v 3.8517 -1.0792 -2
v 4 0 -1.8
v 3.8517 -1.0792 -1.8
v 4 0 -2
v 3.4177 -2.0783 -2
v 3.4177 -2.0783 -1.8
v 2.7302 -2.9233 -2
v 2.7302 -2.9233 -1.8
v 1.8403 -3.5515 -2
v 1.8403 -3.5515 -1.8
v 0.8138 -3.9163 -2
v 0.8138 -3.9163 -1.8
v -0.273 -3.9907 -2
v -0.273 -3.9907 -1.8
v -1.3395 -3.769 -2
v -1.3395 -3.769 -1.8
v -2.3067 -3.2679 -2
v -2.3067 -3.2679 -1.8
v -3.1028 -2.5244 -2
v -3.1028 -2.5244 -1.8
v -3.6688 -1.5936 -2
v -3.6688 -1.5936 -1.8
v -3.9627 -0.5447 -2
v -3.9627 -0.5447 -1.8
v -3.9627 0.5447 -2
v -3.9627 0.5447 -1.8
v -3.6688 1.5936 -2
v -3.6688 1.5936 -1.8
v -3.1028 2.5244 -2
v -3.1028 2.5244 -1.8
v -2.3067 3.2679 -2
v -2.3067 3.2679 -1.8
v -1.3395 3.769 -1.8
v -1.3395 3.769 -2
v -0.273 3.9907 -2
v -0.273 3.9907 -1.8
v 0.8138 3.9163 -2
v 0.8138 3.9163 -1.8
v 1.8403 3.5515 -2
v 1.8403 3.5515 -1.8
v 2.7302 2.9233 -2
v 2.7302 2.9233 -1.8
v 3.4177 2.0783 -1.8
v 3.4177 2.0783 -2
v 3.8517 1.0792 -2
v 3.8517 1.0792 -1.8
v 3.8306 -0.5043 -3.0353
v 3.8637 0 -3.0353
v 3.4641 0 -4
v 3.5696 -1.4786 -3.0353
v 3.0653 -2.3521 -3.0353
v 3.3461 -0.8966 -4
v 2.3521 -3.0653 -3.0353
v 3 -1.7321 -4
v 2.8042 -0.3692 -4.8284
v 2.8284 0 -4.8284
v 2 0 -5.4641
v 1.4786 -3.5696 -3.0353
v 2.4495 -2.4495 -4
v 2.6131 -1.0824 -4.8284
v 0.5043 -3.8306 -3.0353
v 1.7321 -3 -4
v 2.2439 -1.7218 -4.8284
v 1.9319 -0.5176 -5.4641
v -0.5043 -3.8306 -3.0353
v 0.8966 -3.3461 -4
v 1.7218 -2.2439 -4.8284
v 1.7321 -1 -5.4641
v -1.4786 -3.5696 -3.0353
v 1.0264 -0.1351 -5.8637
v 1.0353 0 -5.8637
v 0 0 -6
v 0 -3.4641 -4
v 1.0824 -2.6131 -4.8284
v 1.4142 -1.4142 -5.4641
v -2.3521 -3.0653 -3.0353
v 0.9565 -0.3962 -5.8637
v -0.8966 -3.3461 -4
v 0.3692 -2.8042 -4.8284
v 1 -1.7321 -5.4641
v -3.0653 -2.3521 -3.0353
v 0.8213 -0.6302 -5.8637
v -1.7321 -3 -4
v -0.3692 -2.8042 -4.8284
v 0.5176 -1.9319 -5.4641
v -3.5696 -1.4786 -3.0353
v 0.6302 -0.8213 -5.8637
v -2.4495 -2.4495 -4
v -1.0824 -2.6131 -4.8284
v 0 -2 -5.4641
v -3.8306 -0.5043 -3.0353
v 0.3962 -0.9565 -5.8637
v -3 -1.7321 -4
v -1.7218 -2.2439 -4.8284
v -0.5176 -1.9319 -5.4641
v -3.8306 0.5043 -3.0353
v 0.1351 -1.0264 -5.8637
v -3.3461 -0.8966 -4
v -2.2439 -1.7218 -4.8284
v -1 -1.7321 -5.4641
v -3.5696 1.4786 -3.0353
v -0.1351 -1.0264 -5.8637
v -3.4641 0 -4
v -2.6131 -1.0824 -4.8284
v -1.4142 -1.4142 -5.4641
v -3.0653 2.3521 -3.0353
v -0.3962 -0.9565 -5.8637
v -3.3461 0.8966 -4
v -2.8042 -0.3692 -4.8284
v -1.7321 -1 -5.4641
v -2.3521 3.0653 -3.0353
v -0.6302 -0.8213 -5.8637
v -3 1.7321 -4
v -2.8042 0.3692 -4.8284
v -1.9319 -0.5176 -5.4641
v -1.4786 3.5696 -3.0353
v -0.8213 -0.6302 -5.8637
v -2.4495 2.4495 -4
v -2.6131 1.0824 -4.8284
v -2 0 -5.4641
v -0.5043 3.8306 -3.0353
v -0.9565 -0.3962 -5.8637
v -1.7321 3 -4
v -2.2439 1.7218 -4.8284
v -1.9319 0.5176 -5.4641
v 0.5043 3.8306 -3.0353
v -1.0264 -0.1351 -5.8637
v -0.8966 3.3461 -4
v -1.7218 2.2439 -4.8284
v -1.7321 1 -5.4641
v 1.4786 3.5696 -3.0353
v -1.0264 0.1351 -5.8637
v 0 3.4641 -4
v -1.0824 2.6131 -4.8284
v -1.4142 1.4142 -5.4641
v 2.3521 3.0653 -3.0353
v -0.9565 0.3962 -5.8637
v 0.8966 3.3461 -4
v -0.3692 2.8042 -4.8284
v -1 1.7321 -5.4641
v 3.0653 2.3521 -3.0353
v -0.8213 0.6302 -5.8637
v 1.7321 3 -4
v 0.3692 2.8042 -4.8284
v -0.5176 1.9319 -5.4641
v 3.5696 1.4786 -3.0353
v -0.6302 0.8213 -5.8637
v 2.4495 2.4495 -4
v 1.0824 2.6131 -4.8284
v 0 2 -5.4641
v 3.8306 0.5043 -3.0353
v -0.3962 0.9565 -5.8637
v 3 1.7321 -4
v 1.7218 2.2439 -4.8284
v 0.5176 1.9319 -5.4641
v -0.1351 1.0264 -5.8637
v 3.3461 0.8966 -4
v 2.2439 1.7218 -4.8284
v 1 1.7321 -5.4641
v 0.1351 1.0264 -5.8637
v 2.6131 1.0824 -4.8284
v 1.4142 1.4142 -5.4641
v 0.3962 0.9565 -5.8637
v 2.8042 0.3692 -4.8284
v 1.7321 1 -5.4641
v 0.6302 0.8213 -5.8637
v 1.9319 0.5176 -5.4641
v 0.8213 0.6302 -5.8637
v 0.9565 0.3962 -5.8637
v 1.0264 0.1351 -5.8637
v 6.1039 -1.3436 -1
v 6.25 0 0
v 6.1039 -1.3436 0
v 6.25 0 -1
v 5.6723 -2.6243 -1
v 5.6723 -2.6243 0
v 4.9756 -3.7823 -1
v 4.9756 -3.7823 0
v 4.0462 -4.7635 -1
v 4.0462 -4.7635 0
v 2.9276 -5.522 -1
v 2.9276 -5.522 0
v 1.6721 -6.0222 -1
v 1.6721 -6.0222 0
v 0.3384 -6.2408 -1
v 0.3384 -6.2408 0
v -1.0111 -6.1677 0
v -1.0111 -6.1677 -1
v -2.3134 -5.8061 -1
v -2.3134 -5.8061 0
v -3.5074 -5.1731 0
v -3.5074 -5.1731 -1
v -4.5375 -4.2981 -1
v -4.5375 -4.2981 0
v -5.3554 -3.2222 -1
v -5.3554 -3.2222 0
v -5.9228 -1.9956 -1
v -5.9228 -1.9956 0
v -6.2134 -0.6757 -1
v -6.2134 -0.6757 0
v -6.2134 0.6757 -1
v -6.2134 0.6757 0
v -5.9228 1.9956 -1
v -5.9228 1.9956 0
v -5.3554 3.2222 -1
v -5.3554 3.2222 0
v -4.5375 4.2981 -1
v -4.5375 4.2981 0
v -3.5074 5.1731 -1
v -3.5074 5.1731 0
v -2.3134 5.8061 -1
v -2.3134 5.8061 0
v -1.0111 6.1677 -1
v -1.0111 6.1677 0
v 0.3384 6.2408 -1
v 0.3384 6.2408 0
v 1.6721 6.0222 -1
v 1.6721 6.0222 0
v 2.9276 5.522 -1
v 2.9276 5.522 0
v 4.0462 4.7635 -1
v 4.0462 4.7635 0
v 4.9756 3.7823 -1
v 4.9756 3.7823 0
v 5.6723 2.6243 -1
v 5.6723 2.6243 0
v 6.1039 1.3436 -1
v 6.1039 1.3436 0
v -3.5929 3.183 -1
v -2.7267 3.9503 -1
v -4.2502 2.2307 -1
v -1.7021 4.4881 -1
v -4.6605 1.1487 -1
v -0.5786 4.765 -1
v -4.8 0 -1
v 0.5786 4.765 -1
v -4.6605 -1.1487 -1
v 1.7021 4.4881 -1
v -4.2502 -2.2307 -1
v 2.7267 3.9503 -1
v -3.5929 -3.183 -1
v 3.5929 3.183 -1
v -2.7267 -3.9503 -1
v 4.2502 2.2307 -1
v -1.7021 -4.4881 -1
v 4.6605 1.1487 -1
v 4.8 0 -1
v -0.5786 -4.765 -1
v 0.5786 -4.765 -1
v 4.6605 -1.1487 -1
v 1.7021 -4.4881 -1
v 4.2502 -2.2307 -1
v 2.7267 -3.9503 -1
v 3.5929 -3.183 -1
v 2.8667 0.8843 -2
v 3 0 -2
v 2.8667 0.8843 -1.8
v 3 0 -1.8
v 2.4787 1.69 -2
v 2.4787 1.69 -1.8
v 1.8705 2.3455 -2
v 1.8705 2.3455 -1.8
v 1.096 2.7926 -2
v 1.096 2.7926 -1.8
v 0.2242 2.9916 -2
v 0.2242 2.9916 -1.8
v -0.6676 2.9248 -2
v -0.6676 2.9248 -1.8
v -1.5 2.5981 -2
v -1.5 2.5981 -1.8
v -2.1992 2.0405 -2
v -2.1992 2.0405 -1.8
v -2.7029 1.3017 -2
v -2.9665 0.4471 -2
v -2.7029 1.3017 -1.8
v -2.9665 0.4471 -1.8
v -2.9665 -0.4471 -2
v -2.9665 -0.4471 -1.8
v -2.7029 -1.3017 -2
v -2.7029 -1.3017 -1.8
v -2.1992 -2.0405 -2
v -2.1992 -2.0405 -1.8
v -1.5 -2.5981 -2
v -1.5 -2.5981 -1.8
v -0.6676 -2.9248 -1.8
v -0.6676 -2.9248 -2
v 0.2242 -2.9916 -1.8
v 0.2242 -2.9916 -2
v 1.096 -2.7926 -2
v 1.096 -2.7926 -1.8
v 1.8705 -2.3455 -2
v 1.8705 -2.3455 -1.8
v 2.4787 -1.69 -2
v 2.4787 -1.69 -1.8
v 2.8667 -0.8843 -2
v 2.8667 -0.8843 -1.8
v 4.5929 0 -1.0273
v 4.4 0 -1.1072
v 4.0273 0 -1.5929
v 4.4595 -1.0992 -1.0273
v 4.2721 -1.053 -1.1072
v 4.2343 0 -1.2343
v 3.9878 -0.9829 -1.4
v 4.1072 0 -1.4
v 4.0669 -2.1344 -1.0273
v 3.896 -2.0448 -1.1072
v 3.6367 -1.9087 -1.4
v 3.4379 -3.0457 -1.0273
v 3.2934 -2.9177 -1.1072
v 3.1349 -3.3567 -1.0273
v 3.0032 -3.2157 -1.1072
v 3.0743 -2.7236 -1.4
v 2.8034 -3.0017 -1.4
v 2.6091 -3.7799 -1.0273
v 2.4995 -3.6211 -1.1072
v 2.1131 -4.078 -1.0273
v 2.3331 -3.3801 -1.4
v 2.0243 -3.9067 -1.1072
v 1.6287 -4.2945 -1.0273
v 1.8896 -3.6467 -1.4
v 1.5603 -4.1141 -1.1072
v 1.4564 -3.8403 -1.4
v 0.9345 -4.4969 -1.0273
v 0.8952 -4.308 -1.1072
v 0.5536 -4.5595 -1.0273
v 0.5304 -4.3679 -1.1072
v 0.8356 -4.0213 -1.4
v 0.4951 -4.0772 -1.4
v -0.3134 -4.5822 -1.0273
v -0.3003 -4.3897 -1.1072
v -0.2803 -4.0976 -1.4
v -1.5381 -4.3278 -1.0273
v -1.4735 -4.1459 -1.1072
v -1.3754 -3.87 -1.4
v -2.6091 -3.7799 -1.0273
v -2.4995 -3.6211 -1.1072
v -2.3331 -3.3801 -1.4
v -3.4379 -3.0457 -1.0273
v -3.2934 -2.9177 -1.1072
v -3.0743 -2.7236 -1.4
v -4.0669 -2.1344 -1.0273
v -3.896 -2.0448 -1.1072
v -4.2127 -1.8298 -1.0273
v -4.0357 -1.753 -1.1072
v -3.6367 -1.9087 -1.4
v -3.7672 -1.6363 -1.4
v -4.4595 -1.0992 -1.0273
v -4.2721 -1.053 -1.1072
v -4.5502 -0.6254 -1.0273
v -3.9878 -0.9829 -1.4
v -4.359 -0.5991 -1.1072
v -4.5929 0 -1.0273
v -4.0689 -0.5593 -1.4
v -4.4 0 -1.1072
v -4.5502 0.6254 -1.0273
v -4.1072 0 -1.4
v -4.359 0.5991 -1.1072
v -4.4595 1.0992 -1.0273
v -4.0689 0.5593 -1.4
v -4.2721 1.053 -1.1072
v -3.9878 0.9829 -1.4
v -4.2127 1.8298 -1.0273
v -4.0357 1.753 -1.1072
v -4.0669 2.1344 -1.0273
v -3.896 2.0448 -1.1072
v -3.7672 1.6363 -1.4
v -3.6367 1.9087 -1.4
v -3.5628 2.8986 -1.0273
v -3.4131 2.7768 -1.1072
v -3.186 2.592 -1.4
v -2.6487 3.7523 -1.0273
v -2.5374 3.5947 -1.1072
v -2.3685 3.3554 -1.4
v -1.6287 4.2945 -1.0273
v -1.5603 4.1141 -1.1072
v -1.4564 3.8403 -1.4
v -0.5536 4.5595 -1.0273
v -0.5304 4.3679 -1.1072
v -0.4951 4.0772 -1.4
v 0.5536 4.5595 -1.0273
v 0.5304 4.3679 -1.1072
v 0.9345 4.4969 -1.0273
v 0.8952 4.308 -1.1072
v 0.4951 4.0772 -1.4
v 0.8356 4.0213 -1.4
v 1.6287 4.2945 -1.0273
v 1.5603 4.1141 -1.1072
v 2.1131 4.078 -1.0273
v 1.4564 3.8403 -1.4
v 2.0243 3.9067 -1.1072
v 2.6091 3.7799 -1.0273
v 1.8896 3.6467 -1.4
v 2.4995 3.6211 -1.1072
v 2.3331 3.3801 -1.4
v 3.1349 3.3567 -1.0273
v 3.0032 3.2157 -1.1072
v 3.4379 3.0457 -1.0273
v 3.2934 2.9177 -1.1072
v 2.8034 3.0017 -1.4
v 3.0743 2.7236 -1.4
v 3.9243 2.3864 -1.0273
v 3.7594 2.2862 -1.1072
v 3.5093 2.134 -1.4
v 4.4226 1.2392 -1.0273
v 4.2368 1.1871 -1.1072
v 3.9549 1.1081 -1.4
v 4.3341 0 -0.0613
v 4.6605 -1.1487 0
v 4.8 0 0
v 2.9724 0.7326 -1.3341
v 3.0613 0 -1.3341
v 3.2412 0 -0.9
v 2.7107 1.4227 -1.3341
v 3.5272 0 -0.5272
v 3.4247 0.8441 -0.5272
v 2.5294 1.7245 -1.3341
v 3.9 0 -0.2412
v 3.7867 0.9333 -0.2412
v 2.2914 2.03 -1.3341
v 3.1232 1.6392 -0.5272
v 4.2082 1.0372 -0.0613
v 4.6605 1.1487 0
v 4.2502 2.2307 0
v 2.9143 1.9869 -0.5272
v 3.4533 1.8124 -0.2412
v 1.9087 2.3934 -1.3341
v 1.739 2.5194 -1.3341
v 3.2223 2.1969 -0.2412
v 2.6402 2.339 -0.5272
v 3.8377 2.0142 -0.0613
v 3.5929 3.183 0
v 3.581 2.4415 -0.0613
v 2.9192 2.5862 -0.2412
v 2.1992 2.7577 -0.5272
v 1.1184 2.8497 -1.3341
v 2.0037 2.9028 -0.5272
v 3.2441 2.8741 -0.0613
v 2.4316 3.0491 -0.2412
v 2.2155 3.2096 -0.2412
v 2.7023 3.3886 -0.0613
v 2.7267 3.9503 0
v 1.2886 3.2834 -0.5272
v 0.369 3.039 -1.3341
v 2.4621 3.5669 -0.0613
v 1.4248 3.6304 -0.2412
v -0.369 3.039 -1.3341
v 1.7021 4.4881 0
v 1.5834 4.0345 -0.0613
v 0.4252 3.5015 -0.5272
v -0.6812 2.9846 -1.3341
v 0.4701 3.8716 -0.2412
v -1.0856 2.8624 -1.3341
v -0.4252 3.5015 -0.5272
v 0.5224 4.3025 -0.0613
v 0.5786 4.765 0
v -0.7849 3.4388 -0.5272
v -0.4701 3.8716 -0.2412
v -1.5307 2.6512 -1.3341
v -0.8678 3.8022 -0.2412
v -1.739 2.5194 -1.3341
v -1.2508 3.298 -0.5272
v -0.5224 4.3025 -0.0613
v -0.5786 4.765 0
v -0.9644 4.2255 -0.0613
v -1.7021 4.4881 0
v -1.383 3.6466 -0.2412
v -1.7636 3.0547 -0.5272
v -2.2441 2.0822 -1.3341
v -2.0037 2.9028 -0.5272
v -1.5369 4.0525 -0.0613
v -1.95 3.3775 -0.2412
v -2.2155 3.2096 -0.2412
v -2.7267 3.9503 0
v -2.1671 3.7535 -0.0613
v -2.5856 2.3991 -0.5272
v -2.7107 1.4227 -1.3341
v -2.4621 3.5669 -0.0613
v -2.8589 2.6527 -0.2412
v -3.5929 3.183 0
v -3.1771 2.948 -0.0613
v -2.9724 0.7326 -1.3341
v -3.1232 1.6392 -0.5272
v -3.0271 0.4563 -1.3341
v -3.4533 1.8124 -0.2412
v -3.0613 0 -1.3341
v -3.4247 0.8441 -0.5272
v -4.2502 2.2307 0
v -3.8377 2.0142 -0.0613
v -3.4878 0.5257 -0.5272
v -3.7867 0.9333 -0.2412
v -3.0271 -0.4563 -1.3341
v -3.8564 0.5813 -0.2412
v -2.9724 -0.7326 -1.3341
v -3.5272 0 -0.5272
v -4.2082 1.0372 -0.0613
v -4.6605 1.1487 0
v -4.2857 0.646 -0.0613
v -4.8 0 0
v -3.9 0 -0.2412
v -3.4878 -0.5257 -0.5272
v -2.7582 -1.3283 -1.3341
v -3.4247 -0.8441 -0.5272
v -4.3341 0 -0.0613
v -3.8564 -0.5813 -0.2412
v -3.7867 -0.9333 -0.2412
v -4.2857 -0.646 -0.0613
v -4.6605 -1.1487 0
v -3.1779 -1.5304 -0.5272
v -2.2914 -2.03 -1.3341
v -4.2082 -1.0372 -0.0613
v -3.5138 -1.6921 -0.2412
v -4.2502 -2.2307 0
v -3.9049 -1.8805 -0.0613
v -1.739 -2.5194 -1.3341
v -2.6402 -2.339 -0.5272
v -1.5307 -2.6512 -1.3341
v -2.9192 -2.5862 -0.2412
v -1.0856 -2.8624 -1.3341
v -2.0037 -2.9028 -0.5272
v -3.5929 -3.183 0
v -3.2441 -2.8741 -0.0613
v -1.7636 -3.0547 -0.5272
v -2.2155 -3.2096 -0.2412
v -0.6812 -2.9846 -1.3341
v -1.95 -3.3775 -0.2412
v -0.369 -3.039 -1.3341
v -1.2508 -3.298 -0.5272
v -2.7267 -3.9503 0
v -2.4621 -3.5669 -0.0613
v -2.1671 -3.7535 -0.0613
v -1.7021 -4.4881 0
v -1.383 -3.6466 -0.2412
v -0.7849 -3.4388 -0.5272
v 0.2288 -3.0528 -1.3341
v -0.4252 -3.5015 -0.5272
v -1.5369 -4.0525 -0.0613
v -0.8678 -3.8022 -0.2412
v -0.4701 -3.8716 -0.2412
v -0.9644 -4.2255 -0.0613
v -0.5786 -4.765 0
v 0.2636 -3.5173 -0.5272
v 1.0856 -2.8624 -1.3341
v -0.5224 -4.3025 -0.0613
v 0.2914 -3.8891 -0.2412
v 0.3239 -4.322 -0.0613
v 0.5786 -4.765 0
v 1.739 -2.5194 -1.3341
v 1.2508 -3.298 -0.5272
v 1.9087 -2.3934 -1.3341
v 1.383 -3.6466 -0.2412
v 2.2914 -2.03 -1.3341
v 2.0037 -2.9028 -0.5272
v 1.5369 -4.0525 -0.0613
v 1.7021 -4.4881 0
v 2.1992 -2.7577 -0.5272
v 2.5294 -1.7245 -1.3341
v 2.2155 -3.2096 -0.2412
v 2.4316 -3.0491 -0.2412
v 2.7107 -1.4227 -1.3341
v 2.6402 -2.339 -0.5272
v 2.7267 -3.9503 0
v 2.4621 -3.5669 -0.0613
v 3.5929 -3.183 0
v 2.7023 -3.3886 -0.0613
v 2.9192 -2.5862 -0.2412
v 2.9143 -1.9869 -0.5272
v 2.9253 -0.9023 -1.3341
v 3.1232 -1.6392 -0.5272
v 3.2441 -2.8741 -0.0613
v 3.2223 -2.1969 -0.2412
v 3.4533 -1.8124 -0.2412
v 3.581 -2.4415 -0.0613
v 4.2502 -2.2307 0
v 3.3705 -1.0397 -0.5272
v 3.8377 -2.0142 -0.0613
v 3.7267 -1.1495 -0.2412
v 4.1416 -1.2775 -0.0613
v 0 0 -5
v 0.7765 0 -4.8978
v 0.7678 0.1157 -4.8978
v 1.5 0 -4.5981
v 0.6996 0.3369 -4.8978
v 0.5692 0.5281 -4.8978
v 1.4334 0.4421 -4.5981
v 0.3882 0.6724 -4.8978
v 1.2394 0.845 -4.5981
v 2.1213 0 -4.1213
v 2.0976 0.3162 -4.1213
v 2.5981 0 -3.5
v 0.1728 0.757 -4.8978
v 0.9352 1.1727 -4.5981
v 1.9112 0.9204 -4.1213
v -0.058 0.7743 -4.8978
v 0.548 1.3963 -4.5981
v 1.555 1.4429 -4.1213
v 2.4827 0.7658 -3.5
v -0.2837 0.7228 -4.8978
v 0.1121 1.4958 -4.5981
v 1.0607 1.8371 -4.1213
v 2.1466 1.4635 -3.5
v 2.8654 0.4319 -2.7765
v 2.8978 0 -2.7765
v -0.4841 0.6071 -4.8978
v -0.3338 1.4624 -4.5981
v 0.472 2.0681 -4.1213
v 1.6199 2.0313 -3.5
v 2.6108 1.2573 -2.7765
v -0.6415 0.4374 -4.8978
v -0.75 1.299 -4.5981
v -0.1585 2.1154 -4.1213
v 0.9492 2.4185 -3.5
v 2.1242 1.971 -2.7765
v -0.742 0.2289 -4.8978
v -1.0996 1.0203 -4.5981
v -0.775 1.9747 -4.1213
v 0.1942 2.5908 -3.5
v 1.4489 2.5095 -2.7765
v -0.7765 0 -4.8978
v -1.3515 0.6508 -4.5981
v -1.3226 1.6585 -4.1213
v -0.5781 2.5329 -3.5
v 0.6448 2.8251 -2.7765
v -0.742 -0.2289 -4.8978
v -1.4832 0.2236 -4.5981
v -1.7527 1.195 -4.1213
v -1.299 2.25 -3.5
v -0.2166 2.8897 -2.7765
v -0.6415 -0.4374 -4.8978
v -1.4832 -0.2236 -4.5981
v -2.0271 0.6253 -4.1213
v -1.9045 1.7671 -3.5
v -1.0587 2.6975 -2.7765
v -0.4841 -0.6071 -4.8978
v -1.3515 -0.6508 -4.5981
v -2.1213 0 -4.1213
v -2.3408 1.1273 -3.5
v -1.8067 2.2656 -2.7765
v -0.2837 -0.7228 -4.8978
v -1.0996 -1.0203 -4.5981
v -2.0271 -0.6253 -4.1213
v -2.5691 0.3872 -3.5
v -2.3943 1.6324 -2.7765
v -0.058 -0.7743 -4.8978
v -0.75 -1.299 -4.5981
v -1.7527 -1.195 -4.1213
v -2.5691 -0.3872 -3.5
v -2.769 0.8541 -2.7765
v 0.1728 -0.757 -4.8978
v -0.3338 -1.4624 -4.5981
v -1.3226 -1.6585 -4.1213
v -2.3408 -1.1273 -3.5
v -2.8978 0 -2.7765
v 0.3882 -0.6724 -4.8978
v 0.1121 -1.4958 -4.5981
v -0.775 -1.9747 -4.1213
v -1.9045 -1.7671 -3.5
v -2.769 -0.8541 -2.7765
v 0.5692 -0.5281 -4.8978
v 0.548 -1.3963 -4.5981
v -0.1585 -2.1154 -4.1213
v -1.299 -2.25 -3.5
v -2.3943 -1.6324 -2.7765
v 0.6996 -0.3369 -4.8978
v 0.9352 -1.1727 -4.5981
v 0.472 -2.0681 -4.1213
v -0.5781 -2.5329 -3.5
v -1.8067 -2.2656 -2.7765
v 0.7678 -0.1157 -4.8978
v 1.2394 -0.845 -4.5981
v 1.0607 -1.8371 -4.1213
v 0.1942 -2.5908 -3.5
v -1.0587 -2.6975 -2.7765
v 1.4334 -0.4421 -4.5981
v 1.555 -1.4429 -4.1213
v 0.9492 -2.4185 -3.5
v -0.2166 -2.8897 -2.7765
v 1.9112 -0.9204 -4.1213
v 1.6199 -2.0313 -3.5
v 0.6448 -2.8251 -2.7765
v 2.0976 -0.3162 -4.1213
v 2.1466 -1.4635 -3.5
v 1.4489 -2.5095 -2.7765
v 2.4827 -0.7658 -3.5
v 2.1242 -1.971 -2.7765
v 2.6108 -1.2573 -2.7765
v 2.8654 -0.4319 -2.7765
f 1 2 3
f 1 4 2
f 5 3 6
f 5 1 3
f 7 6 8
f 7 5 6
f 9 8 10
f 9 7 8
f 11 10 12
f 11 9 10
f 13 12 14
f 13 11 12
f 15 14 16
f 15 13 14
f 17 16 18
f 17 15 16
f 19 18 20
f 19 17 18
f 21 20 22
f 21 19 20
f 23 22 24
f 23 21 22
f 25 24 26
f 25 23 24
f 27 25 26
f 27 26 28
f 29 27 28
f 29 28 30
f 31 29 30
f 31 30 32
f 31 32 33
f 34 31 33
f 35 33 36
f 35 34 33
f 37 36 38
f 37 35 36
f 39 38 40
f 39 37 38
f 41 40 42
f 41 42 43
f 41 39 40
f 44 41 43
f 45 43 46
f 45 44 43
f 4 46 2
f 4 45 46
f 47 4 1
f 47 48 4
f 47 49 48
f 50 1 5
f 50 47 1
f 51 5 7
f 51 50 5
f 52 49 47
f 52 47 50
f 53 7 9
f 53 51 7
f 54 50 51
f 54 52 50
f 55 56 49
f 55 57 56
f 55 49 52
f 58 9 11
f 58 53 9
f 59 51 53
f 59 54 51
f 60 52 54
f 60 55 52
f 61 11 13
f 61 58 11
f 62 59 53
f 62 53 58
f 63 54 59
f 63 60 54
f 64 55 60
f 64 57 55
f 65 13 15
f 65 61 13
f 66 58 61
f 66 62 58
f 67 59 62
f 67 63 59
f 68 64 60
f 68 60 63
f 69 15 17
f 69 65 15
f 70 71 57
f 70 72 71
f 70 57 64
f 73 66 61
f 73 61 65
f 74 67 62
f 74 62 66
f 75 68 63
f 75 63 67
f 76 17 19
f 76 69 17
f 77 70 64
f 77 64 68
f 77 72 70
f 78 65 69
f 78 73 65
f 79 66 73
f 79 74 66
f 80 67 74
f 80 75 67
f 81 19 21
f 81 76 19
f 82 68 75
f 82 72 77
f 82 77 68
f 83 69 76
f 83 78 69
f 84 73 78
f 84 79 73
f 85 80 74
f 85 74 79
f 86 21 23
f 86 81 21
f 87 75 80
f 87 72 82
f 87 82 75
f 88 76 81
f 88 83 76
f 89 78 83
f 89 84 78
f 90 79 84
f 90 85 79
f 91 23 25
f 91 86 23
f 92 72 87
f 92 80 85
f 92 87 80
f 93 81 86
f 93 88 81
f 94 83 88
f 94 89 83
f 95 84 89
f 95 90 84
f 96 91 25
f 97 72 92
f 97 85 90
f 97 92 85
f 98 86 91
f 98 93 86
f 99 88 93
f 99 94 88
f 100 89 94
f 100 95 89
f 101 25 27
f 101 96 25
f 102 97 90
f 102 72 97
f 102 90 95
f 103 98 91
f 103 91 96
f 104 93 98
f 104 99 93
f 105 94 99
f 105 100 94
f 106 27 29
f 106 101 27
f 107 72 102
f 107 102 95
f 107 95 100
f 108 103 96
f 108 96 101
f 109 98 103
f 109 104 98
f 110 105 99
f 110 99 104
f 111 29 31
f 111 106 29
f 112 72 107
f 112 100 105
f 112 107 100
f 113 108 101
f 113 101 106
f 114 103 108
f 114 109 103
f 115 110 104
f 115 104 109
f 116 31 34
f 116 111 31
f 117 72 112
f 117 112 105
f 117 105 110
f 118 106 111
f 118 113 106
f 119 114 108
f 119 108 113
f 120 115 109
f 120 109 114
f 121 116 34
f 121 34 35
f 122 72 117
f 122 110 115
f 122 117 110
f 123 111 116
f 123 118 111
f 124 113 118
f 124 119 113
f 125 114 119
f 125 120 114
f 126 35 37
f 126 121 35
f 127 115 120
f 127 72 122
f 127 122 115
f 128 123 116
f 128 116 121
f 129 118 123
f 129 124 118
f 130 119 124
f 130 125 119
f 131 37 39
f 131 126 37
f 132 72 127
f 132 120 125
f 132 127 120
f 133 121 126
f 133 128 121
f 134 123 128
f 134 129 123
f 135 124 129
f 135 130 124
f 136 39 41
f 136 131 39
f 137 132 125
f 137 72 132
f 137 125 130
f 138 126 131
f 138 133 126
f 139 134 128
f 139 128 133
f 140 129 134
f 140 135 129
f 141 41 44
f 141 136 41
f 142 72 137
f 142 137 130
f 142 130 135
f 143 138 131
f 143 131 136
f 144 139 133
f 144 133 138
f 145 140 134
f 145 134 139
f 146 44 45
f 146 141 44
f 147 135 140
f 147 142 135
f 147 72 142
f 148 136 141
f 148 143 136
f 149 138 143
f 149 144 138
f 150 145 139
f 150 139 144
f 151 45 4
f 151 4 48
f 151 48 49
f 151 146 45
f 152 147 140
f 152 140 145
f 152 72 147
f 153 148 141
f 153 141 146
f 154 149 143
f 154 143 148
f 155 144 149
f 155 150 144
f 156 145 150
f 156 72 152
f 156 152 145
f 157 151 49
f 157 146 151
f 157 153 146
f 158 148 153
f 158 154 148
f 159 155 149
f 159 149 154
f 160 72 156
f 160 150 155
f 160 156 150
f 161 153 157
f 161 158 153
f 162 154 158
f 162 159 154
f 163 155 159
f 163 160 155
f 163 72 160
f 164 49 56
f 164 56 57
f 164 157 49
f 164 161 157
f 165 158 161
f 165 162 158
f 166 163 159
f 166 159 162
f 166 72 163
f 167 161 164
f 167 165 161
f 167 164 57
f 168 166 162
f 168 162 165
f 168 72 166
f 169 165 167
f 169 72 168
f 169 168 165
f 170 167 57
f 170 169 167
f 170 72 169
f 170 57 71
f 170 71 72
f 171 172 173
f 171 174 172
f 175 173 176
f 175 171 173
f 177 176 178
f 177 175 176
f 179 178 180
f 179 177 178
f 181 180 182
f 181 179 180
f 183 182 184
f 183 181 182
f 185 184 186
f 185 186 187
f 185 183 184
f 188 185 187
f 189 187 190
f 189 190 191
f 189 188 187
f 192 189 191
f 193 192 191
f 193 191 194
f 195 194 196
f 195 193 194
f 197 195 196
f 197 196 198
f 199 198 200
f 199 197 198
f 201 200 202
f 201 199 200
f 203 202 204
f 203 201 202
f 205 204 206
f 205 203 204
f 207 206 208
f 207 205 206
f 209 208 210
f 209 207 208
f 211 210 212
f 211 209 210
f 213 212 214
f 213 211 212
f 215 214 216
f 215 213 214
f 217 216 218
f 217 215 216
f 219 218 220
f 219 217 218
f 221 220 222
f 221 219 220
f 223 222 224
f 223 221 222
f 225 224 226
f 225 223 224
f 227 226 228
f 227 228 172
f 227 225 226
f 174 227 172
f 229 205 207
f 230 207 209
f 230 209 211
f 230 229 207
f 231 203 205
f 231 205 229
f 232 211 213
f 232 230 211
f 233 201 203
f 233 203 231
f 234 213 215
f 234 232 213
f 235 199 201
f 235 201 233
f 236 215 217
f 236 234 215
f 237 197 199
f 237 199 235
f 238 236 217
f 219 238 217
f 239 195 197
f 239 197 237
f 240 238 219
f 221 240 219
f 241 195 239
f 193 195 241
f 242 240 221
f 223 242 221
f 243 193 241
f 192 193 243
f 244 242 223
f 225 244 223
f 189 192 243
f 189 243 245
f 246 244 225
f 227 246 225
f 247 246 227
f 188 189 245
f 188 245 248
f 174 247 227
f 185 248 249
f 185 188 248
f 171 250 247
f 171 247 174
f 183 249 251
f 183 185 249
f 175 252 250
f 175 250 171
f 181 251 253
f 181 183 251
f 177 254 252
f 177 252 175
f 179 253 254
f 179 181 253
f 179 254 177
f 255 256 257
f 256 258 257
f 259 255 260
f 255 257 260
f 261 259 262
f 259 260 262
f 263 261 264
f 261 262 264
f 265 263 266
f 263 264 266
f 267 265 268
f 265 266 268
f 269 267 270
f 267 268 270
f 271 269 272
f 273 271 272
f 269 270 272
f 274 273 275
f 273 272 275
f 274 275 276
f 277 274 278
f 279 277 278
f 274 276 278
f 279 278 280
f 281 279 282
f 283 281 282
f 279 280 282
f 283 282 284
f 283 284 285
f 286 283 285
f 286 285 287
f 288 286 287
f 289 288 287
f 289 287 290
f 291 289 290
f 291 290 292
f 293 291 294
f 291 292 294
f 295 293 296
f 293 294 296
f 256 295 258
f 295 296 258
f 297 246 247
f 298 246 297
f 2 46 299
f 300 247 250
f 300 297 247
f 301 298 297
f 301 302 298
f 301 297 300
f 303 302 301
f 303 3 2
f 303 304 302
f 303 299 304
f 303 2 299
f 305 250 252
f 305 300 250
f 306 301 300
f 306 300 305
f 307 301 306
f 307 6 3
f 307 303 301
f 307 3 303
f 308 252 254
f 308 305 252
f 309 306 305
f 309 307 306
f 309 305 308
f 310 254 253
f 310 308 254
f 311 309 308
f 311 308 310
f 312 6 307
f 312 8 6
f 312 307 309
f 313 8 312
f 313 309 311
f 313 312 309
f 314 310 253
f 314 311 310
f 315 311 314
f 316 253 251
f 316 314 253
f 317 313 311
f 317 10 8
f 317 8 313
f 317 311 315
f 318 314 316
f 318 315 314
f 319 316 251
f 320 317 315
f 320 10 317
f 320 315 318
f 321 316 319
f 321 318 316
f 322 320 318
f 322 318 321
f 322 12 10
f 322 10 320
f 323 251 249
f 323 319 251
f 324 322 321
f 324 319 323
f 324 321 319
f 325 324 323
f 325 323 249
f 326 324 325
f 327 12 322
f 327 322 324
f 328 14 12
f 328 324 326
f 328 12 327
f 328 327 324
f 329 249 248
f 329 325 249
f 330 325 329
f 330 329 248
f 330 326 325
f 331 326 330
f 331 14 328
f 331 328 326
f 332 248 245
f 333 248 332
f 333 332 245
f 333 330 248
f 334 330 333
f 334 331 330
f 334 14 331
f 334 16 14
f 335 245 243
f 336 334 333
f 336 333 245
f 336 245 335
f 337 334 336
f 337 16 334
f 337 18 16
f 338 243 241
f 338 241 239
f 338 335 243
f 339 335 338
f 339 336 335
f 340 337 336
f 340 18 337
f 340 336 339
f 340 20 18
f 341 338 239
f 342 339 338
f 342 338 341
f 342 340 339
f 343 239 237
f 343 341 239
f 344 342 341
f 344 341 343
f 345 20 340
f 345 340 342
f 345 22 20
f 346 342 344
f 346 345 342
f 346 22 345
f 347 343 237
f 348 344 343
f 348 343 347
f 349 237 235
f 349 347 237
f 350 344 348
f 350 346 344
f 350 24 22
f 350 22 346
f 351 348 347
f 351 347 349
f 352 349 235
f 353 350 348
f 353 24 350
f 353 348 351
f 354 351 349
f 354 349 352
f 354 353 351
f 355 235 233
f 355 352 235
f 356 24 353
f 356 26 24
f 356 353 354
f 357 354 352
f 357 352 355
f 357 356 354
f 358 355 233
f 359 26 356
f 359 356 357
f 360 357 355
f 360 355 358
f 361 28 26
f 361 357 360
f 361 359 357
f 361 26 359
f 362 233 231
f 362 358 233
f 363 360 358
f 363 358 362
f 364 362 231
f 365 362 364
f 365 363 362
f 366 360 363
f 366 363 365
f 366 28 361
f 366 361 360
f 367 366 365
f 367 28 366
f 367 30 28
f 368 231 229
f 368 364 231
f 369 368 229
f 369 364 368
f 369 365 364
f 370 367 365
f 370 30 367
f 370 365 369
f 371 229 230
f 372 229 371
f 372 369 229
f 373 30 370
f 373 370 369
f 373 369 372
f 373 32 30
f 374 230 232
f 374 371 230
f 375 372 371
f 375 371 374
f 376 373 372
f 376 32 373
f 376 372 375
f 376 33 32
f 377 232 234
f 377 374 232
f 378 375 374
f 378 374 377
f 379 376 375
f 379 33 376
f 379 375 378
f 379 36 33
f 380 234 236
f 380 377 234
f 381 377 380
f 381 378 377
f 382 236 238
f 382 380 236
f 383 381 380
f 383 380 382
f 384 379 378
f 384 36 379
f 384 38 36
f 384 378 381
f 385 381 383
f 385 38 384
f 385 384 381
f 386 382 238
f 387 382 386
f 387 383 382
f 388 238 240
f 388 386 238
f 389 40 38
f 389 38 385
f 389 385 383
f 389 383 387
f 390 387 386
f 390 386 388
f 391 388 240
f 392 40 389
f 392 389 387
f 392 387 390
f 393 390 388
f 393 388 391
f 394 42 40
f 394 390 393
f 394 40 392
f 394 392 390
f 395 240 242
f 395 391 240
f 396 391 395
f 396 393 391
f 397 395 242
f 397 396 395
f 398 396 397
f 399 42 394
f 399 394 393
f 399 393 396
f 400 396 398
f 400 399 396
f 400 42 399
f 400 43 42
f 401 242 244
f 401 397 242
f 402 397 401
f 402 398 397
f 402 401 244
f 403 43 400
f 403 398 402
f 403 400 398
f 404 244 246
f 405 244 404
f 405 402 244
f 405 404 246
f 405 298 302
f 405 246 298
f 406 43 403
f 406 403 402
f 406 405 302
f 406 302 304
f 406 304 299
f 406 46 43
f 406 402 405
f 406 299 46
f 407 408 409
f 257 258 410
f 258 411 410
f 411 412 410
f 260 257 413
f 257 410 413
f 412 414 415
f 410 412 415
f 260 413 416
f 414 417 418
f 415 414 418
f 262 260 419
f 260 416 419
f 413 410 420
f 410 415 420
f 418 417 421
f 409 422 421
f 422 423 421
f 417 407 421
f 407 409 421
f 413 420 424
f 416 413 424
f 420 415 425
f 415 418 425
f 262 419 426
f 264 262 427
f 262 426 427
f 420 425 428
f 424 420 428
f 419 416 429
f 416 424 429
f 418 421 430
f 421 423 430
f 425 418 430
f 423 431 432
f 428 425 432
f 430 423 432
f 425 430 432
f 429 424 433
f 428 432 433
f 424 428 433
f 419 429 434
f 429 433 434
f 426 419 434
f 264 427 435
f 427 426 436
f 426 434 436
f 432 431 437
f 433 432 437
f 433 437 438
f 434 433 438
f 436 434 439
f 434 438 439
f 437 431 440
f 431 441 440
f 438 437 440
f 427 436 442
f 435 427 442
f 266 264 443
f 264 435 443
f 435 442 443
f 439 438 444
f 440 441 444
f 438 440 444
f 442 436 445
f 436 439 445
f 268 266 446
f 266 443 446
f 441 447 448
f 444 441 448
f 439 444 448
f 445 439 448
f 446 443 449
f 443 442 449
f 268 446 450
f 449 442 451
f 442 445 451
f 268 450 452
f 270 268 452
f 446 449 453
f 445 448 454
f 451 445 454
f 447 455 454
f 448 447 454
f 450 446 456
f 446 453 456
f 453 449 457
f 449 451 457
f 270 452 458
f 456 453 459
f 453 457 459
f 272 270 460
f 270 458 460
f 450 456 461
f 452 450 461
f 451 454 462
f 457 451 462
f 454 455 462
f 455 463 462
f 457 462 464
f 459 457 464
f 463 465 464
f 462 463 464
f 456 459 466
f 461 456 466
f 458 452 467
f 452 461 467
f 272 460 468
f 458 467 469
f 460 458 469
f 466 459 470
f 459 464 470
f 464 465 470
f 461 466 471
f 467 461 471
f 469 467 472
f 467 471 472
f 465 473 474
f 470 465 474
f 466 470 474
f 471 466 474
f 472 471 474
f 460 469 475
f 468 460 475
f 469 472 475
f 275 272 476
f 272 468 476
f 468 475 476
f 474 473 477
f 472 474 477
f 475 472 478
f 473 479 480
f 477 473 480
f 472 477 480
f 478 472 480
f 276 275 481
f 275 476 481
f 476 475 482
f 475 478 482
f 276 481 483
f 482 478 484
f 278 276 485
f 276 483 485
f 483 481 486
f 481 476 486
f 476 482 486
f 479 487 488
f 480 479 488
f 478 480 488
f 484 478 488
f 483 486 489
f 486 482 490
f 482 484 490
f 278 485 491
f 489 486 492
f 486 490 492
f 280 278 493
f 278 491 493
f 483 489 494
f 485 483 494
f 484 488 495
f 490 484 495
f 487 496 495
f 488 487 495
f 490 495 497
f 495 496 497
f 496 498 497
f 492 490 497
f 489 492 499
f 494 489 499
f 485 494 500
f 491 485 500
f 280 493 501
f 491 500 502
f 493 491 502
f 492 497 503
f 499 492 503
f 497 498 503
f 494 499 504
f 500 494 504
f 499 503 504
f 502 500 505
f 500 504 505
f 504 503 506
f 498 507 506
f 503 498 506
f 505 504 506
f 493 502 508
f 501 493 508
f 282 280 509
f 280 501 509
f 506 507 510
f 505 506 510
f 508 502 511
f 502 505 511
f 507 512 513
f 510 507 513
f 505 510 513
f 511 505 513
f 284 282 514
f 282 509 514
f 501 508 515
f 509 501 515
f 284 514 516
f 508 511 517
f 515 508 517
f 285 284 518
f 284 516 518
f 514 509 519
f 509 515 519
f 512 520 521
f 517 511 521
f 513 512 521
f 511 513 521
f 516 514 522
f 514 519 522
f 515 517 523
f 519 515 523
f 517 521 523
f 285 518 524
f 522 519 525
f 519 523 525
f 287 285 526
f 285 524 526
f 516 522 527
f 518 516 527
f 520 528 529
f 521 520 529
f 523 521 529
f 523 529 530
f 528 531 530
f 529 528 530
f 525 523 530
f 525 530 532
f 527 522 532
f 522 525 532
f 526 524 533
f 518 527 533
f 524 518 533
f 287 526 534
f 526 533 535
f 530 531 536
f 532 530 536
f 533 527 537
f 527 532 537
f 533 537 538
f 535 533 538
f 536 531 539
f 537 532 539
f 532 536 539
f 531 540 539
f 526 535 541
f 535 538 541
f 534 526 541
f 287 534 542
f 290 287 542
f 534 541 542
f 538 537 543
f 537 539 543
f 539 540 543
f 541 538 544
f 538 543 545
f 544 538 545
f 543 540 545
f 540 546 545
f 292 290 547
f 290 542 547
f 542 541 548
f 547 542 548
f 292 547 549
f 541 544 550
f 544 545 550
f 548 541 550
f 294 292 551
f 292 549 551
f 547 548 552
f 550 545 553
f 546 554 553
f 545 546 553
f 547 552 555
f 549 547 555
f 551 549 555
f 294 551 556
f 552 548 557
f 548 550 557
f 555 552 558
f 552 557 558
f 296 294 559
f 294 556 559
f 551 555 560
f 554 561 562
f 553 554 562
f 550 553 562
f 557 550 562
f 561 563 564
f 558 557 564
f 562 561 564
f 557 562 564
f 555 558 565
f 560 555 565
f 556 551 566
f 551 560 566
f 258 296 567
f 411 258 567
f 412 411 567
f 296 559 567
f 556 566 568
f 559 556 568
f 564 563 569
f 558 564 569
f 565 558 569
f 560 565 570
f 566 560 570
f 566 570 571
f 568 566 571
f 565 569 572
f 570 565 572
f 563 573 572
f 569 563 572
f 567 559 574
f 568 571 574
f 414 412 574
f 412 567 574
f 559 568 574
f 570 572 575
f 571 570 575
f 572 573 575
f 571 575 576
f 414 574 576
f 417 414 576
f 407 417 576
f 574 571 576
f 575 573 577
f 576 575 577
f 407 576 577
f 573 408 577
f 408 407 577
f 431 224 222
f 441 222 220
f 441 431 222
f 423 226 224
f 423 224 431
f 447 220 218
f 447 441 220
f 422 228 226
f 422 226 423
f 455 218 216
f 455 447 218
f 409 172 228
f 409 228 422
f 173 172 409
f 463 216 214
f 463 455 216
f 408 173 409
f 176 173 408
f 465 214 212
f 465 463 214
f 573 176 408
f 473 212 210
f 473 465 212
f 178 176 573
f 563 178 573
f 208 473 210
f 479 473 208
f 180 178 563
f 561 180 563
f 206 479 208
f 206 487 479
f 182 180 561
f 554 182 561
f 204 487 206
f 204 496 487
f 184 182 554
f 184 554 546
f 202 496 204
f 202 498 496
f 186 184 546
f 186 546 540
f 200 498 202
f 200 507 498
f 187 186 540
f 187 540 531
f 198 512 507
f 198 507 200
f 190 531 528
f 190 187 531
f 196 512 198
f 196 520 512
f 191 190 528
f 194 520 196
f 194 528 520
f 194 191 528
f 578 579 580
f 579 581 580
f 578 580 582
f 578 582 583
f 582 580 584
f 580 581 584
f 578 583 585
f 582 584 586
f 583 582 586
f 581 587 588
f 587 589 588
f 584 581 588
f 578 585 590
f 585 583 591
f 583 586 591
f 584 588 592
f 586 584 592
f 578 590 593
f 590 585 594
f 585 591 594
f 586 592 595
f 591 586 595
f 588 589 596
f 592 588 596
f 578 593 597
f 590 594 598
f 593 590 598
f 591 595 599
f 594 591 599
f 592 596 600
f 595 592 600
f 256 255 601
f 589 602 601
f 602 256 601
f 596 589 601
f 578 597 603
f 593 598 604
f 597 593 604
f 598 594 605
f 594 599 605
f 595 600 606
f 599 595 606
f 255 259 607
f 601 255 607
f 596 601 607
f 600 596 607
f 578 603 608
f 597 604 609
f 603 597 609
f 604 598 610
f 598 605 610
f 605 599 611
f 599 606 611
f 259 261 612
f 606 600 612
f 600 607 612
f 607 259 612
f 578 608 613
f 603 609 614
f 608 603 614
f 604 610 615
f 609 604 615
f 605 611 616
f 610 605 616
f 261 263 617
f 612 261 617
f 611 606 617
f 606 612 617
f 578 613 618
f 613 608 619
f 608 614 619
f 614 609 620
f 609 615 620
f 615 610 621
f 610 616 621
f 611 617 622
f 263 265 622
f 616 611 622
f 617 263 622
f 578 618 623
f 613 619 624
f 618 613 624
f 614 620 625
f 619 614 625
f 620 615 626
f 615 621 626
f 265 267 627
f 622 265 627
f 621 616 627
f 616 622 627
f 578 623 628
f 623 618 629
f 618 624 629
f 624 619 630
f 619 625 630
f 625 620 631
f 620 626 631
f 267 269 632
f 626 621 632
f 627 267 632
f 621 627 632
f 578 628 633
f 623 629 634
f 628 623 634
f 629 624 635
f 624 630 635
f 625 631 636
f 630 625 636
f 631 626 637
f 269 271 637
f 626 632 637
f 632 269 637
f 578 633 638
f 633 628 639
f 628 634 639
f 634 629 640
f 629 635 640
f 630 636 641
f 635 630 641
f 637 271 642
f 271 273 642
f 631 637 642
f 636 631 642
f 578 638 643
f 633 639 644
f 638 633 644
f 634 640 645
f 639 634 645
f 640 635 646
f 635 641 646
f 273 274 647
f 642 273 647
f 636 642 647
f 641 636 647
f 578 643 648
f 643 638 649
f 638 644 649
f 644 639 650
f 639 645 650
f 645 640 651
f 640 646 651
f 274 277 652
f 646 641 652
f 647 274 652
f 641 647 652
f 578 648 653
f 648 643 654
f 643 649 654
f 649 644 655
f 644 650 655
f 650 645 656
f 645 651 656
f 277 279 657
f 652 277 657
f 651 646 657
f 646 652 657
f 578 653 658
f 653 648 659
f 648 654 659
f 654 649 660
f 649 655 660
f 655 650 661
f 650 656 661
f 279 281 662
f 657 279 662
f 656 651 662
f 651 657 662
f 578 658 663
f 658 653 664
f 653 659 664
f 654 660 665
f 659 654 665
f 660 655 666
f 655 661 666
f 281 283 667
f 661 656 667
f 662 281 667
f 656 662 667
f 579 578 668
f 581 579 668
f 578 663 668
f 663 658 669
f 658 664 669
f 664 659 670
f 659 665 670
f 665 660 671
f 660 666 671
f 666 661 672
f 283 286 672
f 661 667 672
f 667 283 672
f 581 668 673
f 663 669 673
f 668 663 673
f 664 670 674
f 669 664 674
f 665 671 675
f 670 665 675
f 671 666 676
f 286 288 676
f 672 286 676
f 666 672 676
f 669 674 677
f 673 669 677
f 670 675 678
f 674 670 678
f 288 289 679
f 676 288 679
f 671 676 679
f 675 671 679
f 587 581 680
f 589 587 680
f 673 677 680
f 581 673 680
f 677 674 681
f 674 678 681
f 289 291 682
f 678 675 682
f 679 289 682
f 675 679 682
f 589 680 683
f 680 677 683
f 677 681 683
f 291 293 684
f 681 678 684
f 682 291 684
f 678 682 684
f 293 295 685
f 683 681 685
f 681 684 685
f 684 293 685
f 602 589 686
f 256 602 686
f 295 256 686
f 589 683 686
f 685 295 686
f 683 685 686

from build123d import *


# Read off the part's stored shape, not the designer's step: Оболочка1
with BuildPart() as part:
    # Эскиз1 → Повернуть1 (revolve)
    with BuildSketch(Plane(origin=(0, 0, 0), x_dir=(1, 0, 0), z_dir=(0, 1, 0))):
        with BuildLine():
            Line((0, 6), (0, 1))
            Line((0, 1), (3.872983346, 1))
            ThreePointArc((3.872983346, 1), (3.968118785, 1.49598283), (4, 2))
            ThreePointArc((4, 2), (2.828427125, 4.828427125), (0, 6))
        make_face()
        with BuildLine():
            Line((3.872983346, 1), (0, 1))
            Line((0, 1), (0, 0))
            Line((0, 0), (3.464101615, 0))
            ThreePointArc((3.464101615, 0), (3.702459174, 0.486132084), (3.872983346, 1))
        make_face()
        with BuildLine():
            ThreePointArc((4, 2), (3.968118785, 1.49598283), (3.872983346, 1))
            ThreePointArc((3.872983346, 1), (3.702459174, 0.486132084), (3.464101615, 0))
            Line((3.464101615, 0), (6.25, 0))
            Line((6.25, 0), (6.25, 1))
            Line((6.25, 1), (4.8, 1))
            ThreePointArc((4.8, 1), (4.234314575, 1.234314575), (4, 1.8))
            Line((4, 1.8), (4, 2))
        make_face()
    revolve(axis=Axis((0, 0, -1), (0, 0, -1)))

    # Оболочка1 outline → Оболочка1 (revolve, cut)
    with BuildSketch(Plane.XZ):
        with BuildLine():
            ThreePointArc((3, -1.8), (3.527207794, -0.527207794), (4.8, 0))
            Line((4.8, 0), (0, 0))
            Line((0, 0), (0, -5))
            ThreePointArc((0, -5), (2.121320345, -4.121320342), (3, -1.999999997))
            Line((3, -1.999999997), (3, -1.8))
        make_face()
    revolve(axis=Axis((0, 0, 0), (0, 0, 1)), mode=Mode.SUBTRACT)


solid = part.part
